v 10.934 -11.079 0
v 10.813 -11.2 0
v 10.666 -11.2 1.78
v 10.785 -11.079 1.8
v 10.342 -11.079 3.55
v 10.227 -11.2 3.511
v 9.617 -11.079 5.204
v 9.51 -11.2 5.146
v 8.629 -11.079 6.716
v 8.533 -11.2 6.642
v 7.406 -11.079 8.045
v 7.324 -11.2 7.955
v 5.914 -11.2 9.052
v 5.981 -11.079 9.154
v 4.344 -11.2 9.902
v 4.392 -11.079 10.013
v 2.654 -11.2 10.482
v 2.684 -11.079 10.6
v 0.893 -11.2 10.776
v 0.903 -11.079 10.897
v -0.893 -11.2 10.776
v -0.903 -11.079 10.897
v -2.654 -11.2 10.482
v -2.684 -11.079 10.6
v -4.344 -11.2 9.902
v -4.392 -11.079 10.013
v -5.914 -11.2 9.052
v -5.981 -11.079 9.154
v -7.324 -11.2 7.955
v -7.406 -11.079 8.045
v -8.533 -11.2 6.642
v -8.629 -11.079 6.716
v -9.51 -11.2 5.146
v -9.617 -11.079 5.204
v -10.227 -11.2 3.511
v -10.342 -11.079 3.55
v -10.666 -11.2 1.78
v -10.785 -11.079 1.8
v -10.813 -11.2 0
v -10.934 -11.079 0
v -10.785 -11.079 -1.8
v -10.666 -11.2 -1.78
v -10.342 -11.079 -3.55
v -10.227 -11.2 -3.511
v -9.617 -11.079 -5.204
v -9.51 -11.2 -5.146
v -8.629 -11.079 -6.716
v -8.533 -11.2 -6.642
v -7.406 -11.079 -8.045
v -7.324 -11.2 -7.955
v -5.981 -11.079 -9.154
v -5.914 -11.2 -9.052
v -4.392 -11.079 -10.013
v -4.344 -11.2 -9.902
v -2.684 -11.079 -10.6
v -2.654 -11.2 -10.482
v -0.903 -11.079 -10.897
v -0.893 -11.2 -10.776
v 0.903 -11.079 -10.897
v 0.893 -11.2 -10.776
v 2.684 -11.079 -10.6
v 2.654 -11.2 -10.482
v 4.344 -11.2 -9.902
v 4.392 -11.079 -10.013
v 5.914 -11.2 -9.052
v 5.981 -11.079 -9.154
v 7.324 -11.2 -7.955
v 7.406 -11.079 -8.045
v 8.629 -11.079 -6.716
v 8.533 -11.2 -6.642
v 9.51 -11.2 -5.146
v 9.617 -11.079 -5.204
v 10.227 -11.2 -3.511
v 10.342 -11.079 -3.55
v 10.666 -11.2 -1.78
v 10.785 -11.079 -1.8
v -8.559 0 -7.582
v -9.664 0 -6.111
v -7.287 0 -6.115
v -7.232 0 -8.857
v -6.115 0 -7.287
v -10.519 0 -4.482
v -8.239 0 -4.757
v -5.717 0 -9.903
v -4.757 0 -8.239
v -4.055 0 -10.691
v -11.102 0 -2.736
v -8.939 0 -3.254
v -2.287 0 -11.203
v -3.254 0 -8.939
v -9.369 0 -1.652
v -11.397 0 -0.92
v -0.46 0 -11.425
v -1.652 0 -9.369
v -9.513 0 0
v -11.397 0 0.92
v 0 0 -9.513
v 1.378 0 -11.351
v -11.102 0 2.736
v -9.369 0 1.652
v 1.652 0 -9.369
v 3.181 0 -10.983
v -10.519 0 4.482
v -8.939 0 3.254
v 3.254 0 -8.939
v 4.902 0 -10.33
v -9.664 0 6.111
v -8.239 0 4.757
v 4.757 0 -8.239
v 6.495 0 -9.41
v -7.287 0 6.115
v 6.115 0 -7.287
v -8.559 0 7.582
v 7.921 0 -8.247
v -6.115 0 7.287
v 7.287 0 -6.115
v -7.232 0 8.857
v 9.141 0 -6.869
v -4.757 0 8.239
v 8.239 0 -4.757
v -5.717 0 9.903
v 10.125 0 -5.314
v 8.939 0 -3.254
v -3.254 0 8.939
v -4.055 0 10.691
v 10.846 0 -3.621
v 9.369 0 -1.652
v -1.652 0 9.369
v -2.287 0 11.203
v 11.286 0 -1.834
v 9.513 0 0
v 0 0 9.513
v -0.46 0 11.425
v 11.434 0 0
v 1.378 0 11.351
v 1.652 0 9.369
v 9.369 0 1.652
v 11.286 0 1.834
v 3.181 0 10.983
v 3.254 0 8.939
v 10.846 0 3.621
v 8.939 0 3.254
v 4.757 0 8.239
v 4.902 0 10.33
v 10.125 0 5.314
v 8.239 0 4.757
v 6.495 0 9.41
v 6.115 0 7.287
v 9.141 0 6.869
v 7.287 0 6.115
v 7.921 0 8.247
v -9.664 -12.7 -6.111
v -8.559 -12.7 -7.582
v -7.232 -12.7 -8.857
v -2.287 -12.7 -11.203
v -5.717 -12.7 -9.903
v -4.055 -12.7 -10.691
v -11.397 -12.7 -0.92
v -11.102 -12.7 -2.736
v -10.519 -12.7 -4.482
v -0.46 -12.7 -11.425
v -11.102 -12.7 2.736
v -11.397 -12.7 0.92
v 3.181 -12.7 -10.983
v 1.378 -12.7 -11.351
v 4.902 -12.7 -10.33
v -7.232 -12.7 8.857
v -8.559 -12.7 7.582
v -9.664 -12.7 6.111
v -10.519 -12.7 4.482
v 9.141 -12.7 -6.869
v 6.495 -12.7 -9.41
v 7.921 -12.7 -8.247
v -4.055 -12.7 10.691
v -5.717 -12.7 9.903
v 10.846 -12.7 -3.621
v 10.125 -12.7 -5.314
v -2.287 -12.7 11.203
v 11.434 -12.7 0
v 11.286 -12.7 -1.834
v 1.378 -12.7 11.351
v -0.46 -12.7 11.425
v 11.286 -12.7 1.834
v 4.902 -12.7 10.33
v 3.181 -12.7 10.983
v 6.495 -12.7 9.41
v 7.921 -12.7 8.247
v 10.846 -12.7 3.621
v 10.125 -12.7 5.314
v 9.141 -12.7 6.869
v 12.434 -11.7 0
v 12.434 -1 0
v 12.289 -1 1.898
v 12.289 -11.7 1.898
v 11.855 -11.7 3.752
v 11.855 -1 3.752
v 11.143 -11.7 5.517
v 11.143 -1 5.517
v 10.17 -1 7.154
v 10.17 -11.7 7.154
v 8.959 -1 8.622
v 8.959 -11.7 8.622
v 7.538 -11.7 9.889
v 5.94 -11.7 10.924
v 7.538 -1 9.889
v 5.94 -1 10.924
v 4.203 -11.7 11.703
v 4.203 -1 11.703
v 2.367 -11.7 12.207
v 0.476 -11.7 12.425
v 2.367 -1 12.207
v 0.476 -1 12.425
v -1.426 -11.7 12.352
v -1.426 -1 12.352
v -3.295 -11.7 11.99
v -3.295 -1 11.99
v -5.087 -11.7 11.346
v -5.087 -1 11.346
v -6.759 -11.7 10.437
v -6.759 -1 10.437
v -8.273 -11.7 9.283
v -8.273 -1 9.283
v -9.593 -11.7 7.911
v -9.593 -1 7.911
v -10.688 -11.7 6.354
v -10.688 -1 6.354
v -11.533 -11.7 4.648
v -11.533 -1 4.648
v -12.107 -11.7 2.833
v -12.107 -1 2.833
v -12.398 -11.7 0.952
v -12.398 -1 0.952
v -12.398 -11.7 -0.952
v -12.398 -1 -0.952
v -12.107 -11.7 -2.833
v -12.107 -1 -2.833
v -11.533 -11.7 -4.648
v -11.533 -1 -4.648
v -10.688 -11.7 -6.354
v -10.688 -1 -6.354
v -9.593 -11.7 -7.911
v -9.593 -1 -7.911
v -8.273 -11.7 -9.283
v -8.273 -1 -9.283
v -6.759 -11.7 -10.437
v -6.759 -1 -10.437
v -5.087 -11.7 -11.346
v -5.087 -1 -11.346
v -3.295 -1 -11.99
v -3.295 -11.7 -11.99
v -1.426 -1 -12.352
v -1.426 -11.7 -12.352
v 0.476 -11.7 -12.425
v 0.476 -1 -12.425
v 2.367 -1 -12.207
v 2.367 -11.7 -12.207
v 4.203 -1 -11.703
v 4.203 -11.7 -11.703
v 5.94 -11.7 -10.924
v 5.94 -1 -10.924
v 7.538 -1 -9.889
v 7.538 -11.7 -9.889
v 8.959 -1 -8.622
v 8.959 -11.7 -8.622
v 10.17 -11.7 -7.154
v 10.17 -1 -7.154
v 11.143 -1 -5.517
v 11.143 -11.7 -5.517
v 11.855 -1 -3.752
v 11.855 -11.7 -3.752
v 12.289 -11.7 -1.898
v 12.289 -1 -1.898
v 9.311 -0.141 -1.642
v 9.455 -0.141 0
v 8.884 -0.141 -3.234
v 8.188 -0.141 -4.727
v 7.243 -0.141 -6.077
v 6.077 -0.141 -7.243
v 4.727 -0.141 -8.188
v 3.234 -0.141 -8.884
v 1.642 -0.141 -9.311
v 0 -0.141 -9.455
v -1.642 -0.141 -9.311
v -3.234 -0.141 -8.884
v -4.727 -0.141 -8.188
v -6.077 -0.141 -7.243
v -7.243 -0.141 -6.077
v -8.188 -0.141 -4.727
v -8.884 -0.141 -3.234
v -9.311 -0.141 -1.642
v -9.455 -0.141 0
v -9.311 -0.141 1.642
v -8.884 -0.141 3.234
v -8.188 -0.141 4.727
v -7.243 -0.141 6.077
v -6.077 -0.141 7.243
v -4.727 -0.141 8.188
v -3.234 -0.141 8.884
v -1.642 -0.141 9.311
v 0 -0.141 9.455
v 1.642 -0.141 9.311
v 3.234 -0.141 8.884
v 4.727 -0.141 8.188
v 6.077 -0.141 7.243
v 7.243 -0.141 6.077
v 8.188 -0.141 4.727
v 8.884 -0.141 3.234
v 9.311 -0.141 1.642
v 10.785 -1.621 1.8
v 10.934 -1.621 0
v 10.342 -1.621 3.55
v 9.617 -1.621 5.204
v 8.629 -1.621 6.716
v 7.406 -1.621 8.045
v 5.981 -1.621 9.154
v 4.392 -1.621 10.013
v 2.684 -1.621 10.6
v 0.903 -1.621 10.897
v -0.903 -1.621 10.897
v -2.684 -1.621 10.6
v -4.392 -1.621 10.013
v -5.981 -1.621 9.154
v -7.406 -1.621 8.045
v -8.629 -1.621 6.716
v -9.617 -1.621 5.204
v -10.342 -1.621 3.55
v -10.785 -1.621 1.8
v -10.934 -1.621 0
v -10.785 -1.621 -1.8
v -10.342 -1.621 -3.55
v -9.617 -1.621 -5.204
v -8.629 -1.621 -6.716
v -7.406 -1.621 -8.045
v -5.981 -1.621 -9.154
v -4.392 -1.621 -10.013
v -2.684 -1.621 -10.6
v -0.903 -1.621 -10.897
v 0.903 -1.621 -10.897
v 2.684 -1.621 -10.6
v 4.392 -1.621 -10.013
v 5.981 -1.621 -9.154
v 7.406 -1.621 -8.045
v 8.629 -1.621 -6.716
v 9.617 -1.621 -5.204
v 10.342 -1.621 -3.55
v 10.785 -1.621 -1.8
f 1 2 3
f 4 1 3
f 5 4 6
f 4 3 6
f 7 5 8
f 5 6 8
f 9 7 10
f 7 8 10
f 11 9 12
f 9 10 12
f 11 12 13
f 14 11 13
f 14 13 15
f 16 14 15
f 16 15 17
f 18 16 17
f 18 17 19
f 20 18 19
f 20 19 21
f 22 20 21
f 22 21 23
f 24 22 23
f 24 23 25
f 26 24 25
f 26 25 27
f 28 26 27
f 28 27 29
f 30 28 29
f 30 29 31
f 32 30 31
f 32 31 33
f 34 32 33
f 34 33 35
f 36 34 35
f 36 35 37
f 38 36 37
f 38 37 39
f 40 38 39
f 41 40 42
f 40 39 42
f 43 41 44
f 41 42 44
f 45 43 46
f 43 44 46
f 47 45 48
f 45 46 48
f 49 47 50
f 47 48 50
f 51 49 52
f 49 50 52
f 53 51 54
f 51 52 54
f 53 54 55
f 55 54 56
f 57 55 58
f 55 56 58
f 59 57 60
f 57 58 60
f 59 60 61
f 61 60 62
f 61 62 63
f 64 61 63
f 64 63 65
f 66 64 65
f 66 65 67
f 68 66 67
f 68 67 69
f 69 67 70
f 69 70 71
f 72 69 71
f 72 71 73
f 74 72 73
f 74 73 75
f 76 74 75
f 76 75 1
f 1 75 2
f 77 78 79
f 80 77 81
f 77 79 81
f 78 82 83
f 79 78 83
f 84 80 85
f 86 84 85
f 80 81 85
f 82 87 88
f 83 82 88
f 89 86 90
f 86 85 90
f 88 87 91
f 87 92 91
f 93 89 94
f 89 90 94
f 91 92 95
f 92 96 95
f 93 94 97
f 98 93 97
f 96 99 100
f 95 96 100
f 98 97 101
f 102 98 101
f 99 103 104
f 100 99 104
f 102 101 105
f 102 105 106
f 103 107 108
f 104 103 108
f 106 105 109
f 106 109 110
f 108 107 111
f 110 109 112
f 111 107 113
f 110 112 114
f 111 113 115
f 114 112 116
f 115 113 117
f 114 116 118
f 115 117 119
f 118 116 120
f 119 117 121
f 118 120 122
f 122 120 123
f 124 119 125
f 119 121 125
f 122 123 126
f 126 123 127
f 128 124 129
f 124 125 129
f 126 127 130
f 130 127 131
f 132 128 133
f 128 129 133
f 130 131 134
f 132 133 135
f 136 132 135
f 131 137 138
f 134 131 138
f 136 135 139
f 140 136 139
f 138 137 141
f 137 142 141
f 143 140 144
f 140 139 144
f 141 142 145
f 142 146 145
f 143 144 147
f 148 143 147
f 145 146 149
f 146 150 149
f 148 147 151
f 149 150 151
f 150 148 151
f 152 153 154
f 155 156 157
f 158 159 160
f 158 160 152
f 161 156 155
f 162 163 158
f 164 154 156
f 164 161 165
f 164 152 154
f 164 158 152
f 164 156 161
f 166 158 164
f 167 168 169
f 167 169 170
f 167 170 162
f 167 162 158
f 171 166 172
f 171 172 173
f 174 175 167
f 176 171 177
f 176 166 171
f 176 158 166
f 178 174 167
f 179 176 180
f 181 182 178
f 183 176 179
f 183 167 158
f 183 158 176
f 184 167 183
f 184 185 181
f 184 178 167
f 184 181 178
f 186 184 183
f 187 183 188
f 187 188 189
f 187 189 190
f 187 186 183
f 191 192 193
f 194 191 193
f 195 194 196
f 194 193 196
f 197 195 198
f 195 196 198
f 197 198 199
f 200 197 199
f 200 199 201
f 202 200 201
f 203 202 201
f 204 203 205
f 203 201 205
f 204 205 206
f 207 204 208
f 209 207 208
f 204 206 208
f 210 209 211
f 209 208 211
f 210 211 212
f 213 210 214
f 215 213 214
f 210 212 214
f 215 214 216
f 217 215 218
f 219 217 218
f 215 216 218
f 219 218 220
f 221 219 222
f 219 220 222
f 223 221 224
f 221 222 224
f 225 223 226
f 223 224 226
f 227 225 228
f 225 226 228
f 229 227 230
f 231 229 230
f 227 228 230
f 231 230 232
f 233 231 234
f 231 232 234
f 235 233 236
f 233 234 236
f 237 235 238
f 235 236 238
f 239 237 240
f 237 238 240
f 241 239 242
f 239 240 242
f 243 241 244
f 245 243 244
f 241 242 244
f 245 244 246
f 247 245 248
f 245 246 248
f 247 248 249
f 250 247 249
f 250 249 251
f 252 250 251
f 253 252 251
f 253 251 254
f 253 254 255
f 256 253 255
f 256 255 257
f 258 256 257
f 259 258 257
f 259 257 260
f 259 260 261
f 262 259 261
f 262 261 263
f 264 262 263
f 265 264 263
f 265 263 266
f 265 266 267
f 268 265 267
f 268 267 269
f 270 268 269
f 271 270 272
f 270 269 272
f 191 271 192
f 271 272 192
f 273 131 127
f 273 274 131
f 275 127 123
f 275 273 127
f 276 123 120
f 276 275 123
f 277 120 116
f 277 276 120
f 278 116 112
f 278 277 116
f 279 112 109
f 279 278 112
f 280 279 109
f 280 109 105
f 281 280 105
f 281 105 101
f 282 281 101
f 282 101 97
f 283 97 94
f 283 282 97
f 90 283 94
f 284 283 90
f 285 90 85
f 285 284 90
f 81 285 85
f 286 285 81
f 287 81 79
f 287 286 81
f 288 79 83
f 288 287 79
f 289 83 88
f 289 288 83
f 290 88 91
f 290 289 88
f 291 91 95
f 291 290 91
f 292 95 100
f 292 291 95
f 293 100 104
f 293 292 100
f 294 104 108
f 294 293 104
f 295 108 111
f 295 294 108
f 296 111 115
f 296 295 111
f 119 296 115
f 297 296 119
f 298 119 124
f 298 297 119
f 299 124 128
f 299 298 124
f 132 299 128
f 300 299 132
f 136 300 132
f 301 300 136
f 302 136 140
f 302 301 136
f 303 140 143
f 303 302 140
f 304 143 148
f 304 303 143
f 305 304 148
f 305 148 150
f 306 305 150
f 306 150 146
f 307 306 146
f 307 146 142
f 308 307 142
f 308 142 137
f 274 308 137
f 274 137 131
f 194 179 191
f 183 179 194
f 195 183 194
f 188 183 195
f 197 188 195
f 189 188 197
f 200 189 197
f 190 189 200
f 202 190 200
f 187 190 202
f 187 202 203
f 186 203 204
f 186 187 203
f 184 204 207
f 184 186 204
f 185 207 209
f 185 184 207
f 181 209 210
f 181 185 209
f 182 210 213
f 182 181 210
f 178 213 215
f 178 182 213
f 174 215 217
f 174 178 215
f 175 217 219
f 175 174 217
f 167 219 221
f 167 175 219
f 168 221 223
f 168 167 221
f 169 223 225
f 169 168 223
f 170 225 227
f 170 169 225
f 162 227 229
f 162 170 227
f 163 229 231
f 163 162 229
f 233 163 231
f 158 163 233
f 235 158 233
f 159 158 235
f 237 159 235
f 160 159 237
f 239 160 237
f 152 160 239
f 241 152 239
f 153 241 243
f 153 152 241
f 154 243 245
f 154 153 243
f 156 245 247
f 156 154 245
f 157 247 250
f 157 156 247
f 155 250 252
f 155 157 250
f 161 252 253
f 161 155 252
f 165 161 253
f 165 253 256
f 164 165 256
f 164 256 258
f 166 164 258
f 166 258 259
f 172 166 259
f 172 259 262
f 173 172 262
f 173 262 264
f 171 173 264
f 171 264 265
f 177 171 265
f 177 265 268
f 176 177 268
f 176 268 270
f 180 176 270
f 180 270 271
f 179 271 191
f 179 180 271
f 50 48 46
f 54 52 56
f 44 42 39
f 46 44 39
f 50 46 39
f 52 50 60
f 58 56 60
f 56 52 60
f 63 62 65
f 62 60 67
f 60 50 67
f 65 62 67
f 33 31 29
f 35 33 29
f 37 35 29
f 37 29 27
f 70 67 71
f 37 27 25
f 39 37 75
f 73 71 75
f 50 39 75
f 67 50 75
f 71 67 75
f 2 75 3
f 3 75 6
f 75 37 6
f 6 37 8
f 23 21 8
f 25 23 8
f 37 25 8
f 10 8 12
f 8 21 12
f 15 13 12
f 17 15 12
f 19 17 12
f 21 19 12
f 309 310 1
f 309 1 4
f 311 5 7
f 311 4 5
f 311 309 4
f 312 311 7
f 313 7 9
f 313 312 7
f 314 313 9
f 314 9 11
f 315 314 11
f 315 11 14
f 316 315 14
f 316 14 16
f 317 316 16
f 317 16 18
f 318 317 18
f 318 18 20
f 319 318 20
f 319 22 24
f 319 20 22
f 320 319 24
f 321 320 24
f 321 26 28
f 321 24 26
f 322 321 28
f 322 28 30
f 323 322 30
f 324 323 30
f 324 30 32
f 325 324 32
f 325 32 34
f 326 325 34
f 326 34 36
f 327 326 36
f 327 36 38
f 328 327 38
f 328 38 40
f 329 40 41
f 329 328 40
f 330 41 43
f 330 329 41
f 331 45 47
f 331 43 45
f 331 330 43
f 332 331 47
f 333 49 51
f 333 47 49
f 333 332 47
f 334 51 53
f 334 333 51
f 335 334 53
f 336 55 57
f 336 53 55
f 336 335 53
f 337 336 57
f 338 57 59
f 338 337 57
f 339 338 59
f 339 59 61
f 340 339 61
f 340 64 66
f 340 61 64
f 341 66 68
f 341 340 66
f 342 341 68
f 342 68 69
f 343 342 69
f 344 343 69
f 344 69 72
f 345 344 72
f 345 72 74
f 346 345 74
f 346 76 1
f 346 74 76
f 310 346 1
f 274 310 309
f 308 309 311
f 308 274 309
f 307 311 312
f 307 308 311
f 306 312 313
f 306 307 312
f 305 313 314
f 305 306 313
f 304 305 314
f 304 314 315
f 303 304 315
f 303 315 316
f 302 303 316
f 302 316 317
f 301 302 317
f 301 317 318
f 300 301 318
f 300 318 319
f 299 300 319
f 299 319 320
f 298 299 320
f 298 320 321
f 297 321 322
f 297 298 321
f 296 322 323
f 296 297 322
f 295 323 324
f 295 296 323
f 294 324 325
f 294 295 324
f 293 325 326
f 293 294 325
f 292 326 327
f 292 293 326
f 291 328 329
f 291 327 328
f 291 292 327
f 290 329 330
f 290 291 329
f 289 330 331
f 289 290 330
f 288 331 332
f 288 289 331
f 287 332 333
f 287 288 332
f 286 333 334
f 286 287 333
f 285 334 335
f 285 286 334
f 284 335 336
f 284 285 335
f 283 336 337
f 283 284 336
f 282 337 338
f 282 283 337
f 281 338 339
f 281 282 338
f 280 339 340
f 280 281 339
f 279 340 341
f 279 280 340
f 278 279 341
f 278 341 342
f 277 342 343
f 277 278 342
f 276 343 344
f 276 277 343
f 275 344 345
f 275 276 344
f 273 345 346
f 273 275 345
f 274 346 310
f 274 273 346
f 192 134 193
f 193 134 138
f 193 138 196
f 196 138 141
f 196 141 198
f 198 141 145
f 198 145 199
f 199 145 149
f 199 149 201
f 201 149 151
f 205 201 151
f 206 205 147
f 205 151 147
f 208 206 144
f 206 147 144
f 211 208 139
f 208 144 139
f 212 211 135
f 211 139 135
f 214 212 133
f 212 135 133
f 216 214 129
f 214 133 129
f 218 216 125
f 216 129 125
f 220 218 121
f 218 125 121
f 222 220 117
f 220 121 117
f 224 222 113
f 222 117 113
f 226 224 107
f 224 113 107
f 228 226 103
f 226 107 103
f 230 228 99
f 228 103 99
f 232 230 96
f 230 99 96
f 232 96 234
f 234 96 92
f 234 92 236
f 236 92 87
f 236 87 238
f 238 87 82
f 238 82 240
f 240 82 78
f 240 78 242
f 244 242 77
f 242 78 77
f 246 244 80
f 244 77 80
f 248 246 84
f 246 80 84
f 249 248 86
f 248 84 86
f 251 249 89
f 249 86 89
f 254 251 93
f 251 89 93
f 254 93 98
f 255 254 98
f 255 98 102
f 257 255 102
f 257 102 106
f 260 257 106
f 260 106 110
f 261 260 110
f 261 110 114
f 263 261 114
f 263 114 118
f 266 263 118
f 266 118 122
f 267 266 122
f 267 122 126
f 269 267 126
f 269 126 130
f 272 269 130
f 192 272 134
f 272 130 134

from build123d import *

# Parameters (mm, degrees)
F0_R     = 12.4344228223
F1_DEPTH = 12.7
F2_SIZE  = 1
F3_T     = -1.5


# Not quite as in the source:
# - a fillet or chamfer that OpenCascade refuses, or shapes differently, is made with other operations: its cross-section is extruded or revolved along the edge and cut away or added
# - the program builds the solid bodies; features that only make, move or delete a surface that nothing else refers to are left out


with BuildPart() as f1:
    # F0 (on Front) → F1 (new body)
    with BuildSketch(Plane.XZ):
        Circle(F0_R)
    extrude(amount=F1_DEPTH)

    # F2
    f2_edges = [f1.edges().sort_by_distance(p)[0] for p in [
        (-12.434423, 0, 0),
        (12.434423, -6.35, 0),
        (-12.434423, -12.7, 0),
    ]]
    chamfer(f2_edges, length=F2_SIZE)

    # F3
    f3_openings = [f1.faces().sort_by_distance(p)[0] for p in [
        (0, 0, 0),
    ]]
    offset(amount=F3_T, openings=f3_openings)

    # F5: chamfer of 0.2 on 2 edges, made by hand

    # F5_s1 → F5_t2 (revolve, cut)
    with BuildSketch(Plane.XY):
        Polygon((9.5131024788, 0), (9.454523835, -0.1414213562), (9.3131024788, 0), align=None)
    revolve(axis=Axis((0, 0, 0), (0, 1, 0)), mode=Mode.SUBTRACT)


solid = f1.part
